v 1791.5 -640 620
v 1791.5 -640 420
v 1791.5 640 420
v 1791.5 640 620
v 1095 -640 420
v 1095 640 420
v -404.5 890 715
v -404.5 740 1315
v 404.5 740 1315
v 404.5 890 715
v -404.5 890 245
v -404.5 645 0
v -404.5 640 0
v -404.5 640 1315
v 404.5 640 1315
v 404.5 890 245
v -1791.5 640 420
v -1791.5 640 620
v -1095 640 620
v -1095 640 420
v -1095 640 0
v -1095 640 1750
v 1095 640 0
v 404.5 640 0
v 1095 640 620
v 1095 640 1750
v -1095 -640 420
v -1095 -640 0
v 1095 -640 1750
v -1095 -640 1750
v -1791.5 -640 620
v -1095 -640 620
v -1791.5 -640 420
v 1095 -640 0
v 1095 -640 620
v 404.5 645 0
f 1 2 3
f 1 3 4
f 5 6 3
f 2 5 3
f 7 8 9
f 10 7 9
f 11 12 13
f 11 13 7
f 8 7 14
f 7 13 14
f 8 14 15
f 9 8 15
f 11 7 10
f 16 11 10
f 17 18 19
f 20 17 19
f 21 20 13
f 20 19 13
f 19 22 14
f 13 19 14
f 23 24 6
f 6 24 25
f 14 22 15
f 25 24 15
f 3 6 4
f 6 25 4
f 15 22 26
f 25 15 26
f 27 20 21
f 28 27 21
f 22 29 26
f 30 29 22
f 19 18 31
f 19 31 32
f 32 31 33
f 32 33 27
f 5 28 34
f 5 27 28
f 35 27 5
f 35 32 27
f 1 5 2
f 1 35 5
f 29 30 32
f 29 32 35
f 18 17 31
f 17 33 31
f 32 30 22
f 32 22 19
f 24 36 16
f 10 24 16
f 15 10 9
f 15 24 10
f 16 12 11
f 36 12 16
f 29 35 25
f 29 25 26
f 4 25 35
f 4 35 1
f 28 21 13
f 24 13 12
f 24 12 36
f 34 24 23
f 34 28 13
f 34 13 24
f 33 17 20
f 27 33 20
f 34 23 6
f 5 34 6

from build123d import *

# Parameters (mm, degrees)
F0_W     = 696.5
F0_H     = 200
F1_DEPTH = 640
F2_W     = 809
F2_H     = 1315
F3_DEPTH = 890
F4_SIZE2 = 150
F4_SIZE  = 600
F5_SIZE  = 245


with BuildPart() as f1:
    # F0 (on Front) → F1 (new body, symmetric)
    with BuildSketch(Plane.XZ):
        Polygon((-1095, 620), (-1095, 420), (-1095, 0), (1095, 0), (1095, 420), (1095, 620), (1095, 1750), (-1095, 1750), align=None)
        with Locations((1443.25, 520)):
            Rectangle(F0_W, F0_H)
        with Locations((-1443.25, 520)):
            Rectangle(F0_W, F0_H)
    extrude(amount=F1_DEPTH, both=True)

    # F2 (on Front) → F3 (join)
    with BuildSketch(Plane.XZ):
        with Locations((0, 657.5)):
            Rectangle(F2_W, F2_H)
    extrude(amount=-F3_DEPTH)

    # F4
    f4_edges = [f1.edges().sort_by_distance(p)[0] for p in [
        (0, 890, 1315),
    ]]
    f4_side = f1.faces().sort_by_distance((0, 890, 657.5))[0]
    chamfer(f4_edges, length=F4_SIZE, length2=F4_SIZE2, reference=f4_side)

    # F5
    f5_edges = [f1.edges().sort_by_distance(p)[0] for p in [
        (0, 890, 0),
    ]]
    chamfer(f5_edges, length=F5_SIZE)


solid = f1.part
